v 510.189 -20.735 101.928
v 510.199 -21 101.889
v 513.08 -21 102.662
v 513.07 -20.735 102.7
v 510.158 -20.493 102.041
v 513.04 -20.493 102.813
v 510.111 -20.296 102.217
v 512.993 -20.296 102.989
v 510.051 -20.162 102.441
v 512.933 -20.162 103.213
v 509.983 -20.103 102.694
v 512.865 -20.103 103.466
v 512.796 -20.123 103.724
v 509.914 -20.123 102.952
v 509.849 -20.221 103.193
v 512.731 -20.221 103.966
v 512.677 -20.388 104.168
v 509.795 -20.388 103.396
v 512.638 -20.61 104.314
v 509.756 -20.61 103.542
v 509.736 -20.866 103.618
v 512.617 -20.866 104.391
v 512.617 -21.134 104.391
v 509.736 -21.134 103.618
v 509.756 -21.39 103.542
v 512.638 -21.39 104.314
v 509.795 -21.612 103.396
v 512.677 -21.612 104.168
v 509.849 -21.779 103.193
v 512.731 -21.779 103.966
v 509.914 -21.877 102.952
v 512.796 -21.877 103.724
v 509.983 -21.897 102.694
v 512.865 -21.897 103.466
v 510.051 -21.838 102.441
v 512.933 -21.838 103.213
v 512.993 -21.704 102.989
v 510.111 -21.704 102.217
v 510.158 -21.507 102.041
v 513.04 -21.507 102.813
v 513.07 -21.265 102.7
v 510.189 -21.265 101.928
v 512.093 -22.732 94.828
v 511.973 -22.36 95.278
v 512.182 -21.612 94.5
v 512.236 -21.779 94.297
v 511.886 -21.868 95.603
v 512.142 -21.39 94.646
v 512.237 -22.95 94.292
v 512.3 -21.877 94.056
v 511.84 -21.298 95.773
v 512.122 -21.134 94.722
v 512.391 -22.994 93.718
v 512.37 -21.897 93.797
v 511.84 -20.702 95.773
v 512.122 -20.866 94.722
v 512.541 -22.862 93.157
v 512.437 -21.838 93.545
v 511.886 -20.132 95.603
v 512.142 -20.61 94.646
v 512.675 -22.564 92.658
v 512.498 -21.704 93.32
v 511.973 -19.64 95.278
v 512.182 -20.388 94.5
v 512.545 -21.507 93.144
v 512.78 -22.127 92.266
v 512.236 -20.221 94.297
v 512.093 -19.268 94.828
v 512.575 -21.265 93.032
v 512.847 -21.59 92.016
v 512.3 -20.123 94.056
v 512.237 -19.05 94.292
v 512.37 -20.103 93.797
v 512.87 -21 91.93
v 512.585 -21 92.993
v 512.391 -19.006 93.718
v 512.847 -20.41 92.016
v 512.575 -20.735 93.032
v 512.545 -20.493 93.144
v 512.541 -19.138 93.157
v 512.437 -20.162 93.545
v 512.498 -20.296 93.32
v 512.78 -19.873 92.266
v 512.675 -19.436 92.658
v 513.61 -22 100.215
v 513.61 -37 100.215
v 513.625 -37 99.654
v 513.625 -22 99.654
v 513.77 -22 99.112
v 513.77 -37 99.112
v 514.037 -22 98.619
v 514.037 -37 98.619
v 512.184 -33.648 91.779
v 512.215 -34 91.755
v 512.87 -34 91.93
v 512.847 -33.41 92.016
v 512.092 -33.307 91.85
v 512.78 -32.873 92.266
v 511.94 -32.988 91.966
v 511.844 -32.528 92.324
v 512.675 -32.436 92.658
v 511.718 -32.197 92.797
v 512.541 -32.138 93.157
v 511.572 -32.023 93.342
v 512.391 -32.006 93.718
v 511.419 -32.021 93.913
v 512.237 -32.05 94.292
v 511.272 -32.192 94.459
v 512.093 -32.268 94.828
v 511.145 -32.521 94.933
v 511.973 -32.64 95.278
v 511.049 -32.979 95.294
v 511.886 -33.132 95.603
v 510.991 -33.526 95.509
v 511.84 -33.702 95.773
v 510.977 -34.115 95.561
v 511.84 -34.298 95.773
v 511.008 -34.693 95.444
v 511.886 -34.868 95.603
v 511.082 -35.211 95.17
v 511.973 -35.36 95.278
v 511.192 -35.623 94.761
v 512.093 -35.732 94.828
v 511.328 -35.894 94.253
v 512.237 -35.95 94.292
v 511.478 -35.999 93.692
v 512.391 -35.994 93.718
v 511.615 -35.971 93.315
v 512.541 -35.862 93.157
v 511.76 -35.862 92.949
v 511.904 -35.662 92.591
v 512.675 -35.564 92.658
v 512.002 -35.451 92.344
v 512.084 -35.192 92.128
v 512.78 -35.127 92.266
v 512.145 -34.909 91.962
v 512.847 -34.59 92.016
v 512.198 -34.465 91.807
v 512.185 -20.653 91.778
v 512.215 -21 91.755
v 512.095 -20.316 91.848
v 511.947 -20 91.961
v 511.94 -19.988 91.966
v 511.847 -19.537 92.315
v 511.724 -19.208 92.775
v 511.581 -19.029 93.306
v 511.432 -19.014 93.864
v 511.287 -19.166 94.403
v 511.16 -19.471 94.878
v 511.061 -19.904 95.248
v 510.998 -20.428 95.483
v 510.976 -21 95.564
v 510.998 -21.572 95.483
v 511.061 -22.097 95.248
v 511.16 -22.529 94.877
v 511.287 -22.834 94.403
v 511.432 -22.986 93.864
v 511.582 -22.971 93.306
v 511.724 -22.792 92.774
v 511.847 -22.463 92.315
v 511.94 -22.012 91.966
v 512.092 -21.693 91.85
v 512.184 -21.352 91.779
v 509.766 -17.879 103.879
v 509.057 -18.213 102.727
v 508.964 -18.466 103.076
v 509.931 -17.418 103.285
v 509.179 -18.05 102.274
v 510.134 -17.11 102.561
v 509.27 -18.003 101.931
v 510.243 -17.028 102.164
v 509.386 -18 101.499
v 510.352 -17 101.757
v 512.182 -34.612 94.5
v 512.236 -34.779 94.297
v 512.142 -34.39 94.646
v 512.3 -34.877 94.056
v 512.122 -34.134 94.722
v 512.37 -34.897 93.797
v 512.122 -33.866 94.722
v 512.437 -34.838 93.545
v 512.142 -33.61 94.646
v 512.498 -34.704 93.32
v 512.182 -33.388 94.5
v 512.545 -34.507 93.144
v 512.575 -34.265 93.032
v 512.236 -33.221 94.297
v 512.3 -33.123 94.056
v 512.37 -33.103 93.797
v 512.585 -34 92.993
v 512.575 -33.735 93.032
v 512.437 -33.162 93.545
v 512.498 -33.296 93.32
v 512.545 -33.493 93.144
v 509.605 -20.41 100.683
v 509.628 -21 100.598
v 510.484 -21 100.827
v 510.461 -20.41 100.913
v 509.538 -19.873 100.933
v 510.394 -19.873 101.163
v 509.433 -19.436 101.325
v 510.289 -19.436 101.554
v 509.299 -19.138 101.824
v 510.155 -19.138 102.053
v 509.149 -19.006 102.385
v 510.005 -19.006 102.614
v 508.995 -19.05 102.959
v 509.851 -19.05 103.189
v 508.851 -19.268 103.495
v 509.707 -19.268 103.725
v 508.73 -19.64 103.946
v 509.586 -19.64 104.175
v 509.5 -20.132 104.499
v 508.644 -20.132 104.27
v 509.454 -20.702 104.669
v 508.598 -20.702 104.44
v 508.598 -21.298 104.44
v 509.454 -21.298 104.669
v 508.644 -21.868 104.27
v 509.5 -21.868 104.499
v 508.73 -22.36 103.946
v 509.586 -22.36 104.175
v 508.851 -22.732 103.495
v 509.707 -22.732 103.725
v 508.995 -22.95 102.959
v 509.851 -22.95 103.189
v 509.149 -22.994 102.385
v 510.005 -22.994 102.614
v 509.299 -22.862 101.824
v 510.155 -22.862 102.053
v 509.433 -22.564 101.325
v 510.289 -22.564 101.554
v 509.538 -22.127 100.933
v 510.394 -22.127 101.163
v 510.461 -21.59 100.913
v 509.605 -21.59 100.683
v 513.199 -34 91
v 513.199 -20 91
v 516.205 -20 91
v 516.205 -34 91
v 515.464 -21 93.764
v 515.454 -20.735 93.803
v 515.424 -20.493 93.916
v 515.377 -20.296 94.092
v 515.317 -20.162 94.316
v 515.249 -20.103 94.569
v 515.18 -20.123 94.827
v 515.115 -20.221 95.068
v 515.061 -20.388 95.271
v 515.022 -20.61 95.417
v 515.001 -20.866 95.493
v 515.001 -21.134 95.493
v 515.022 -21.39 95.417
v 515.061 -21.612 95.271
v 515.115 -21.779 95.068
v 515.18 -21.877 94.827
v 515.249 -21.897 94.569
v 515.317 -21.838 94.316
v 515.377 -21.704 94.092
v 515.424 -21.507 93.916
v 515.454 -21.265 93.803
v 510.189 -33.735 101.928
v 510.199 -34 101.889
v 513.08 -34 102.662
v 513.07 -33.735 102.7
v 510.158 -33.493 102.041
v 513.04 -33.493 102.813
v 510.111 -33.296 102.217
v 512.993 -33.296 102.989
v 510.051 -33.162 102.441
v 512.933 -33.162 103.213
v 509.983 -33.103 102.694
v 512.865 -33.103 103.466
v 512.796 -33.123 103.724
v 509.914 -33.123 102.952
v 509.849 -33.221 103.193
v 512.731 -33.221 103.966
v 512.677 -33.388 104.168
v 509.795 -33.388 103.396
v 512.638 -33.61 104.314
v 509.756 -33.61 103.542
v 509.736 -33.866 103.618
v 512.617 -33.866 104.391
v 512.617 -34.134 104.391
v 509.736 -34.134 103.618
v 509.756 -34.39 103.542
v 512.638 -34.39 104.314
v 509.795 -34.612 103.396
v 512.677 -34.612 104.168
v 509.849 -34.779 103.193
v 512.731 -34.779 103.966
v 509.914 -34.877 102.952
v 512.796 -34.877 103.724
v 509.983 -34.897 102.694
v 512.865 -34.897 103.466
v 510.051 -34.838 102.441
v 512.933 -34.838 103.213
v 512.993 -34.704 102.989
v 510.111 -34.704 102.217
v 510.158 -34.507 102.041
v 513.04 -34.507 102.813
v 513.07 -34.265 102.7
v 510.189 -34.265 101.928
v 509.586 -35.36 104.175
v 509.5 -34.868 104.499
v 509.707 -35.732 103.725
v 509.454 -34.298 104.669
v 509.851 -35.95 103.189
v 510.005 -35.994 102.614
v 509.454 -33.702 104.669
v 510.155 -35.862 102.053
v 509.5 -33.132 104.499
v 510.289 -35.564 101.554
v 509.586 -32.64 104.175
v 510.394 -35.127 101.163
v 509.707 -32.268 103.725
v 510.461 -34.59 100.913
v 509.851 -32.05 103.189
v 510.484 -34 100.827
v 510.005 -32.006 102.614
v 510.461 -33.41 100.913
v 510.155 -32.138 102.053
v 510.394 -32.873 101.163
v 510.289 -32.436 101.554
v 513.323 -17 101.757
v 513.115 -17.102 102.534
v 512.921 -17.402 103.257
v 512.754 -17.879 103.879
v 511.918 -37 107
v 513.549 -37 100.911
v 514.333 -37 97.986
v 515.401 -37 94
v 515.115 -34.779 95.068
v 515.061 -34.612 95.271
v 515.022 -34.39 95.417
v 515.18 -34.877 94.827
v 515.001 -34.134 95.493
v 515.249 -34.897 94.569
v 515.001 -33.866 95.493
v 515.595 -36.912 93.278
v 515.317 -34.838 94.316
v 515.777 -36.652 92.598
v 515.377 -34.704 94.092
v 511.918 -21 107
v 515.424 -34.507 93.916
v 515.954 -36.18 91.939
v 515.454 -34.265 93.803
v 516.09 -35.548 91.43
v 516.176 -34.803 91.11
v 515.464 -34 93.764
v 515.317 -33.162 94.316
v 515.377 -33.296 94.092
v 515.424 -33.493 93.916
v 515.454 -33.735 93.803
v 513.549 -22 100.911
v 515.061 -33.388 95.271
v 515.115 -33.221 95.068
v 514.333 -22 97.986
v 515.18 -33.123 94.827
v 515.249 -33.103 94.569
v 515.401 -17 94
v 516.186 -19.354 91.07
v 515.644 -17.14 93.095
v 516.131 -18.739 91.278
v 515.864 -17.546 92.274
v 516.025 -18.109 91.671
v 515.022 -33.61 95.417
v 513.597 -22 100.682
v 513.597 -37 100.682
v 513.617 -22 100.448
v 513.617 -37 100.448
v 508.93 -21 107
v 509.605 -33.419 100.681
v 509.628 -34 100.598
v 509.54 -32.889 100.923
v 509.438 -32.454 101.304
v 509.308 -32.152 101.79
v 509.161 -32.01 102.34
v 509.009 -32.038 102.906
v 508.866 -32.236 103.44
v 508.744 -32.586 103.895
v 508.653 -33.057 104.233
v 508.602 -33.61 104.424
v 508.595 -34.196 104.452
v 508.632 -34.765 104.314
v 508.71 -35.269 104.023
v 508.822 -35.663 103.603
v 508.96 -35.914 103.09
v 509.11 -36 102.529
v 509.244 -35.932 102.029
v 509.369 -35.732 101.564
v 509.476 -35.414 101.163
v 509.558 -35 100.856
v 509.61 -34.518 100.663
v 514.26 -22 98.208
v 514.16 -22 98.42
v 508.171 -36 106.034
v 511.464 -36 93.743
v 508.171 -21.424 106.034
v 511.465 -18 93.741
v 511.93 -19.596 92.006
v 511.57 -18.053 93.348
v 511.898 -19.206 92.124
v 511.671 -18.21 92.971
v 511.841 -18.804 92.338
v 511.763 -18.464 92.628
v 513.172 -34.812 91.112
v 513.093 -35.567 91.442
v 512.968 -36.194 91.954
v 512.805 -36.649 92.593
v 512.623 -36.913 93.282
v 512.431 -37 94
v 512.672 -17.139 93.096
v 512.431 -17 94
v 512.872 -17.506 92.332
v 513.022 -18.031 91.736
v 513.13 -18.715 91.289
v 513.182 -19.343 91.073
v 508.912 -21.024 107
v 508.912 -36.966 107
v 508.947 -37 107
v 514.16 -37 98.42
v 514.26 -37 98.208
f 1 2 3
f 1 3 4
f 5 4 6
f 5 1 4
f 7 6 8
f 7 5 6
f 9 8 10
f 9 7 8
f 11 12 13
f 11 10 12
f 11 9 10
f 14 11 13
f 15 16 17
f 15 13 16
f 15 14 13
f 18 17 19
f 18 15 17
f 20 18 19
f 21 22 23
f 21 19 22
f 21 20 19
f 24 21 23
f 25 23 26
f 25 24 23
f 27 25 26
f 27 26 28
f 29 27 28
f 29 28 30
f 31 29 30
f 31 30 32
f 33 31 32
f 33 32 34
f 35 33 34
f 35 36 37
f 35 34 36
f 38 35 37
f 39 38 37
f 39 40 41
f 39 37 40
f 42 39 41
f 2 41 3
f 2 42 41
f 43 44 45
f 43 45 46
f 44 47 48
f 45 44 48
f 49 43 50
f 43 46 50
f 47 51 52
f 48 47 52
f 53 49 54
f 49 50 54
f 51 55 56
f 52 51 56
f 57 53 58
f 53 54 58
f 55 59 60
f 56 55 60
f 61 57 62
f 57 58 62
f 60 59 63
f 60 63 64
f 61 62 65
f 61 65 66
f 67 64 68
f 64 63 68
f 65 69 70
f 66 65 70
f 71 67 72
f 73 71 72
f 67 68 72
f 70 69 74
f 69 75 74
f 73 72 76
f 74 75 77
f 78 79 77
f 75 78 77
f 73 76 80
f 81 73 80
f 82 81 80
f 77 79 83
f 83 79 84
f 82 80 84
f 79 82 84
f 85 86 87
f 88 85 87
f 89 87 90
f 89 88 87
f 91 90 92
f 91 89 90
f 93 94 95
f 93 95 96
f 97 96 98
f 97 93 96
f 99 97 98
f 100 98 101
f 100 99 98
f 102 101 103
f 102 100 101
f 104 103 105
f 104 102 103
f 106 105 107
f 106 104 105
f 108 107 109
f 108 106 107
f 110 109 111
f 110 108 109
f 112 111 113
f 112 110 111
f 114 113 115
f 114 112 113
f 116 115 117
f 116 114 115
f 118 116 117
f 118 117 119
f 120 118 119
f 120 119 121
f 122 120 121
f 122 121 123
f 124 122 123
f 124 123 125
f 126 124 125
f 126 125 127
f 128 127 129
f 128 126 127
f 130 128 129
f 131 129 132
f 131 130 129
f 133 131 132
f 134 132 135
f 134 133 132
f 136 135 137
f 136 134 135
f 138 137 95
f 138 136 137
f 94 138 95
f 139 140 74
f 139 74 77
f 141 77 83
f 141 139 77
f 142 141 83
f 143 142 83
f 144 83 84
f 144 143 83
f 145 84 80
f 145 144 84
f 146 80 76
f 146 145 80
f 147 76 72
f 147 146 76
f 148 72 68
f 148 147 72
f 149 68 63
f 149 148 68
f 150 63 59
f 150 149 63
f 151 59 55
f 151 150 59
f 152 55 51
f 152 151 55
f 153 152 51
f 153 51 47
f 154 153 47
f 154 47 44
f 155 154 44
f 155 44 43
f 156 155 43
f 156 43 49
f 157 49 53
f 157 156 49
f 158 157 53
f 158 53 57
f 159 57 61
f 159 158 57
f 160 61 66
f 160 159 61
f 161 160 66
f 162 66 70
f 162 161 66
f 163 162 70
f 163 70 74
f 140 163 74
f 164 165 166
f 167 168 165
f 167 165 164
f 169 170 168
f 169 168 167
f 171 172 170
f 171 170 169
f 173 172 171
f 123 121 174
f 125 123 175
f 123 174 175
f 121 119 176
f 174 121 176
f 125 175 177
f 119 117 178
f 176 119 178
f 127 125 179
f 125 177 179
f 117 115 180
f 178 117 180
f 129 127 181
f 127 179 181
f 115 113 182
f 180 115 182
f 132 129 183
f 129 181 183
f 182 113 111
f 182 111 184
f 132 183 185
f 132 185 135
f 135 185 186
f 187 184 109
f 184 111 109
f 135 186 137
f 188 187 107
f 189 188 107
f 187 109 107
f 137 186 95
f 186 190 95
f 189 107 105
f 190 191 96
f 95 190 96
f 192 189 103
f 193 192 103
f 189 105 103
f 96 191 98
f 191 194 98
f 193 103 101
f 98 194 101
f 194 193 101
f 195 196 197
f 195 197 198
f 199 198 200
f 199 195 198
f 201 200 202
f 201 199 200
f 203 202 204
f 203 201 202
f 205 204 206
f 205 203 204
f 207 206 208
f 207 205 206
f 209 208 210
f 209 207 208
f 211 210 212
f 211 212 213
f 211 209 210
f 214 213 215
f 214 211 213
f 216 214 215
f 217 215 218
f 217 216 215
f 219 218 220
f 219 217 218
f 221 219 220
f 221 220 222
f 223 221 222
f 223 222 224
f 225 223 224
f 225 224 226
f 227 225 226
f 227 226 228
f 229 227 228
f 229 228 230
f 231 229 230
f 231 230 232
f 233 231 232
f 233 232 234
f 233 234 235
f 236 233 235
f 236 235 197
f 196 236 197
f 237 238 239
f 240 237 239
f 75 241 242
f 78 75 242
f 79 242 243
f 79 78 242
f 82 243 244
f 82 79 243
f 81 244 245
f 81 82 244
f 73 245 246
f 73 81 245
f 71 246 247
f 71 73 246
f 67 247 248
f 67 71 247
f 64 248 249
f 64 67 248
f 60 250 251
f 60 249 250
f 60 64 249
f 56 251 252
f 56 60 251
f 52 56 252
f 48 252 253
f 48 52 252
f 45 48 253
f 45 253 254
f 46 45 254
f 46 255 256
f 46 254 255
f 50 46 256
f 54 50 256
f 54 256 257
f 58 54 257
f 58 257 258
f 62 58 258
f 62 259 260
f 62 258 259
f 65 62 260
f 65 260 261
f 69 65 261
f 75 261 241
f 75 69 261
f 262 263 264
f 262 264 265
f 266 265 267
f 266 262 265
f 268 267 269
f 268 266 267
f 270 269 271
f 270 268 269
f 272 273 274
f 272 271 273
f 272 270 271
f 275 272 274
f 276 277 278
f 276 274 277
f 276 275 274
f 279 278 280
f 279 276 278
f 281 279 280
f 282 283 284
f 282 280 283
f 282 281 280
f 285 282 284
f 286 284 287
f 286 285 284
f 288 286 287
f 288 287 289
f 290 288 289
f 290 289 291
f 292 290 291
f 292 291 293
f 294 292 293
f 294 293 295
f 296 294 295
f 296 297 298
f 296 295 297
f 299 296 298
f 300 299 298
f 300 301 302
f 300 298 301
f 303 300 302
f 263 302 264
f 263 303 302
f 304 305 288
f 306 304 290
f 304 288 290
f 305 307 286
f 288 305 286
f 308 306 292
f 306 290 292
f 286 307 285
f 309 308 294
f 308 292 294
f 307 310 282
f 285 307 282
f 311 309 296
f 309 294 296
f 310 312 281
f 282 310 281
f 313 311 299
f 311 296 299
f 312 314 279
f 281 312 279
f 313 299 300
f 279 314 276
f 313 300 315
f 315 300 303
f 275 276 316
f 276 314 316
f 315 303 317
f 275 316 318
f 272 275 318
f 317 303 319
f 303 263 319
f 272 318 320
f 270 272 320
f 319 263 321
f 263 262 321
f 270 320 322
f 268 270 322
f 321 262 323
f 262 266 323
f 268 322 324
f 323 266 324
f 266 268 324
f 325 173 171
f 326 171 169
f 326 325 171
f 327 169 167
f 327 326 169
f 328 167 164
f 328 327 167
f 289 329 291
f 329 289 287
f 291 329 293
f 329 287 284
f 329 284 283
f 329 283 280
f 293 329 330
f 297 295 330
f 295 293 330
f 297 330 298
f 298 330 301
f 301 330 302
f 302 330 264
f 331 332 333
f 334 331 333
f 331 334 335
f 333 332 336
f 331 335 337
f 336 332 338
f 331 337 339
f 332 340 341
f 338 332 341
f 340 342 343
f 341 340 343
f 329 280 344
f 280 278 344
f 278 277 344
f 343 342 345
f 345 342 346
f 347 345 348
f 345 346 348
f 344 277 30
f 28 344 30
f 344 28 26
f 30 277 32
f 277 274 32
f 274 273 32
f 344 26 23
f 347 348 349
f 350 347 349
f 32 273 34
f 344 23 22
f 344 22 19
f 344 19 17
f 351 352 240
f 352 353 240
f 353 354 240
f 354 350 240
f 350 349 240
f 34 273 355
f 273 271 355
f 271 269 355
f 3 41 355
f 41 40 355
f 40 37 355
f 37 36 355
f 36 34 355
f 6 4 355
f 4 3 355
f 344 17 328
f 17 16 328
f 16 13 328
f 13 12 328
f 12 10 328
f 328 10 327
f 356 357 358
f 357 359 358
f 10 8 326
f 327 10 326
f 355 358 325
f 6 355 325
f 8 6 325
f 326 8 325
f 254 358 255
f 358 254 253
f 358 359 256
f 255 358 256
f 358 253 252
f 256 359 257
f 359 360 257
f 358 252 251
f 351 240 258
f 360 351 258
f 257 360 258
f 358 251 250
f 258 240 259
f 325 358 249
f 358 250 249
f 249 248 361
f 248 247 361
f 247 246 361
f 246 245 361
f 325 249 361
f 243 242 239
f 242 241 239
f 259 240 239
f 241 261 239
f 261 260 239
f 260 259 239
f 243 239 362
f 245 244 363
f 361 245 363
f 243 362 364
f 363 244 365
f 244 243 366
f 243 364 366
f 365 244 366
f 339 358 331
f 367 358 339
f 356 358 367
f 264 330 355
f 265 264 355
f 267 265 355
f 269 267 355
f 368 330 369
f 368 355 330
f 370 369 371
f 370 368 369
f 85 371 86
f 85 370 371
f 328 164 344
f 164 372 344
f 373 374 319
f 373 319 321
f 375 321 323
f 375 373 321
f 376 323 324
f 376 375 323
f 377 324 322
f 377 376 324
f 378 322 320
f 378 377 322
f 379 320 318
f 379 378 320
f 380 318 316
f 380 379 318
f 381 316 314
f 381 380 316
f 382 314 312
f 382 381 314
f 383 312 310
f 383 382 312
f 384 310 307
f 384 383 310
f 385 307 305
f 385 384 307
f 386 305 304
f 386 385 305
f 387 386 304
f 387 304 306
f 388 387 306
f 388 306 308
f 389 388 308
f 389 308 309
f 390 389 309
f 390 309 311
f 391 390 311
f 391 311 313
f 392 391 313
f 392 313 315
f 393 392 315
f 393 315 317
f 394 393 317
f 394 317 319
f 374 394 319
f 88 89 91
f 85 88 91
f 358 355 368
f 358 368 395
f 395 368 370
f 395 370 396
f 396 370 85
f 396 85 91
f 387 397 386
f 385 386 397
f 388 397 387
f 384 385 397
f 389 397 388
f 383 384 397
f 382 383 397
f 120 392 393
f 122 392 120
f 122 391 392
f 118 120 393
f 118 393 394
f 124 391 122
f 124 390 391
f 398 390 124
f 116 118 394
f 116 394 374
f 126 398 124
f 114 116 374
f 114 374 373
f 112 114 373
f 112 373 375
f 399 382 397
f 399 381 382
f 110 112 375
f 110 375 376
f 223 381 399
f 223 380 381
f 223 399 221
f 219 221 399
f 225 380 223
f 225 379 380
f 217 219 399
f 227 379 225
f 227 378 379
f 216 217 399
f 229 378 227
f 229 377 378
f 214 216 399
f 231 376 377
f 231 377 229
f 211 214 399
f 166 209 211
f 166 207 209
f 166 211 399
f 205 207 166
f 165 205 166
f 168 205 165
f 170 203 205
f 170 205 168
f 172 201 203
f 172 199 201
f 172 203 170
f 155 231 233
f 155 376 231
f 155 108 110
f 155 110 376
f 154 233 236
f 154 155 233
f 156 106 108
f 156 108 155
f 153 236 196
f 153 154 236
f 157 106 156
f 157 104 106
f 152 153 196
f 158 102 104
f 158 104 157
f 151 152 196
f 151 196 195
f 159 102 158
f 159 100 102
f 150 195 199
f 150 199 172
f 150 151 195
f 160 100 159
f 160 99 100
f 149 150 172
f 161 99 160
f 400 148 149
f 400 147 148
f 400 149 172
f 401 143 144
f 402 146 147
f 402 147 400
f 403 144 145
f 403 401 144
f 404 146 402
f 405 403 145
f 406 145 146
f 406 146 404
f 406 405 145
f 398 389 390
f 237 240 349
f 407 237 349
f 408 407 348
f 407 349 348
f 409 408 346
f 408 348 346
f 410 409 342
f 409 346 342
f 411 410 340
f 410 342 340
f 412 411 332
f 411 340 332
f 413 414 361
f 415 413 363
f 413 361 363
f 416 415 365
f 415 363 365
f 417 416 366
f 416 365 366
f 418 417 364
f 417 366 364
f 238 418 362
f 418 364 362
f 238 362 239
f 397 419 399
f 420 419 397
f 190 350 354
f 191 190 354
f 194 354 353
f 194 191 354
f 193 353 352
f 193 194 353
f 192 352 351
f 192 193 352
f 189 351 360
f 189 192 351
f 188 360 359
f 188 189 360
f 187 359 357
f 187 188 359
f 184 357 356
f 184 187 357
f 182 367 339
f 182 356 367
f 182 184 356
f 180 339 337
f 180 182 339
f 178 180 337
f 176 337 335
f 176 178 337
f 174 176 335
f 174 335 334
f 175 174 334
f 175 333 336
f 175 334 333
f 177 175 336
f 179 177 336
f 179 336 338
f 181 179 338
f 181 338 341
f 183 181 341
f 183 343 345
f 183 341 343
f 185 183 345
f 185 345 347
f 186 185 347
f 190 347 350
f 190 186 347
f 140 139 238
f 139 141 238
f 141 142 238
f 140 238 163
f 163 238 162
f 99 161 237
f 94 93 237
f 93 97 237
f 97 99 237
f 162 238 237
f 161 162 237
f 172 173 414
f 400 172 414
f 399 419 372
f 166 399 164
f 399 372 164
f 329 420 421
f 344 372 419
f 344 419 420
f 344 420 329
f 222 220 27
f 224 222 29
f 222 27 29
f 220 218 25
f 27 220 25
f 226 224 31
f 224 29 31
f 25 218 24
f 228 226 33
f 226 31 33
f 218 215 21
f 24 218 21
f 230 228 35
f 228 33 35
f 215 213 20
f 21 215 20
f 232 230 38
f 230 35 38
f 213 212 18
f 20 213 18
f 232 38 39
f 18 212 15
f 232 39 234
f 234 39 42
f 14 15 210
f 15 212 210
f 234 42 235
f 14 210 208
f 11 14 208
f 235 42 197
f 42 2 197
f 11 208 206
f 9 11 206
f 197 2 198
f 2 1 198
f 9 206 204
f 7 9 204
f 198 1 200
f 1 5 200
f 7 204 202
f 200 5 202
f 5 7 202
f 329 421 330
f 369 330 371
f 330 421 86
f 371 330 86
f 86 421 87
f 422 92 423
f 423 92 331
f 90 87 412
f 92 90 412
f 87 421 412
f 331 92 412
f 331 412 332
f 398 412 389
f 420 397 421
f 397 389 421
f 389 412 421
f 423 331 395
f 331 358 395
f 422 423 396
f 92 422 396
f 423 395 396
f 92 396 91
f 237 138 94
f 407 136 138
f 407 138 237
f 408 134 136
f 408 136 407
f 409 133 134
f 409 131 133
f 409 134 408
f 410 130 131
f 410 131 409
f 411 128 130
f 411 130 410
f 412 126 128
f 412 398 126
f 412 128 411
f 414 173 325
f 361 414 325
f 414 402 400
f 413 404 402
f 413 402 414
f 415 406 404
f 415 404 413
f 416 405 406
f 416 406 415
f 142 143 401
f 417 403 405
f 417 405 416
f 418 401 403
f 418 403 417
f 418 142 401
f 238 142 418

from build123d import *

# Parameters (mm, degrees)
CYLINDER119_R               = 2
CYLINDER119_DEPTH           = 1
CYLINDER119_PLACEMENT_ANGLE = 75
CYLINDER121_R               = 2
CYLINDER121_DEPTH           = 1
CYLINDER121_PLACEMENT_ANGLE = 75
CYLINDER122_R               = 2
CYLINDER122_DEPTH           = 1.4
CYLINDER122_PLACEMENT_ANGLE = 75
CYLINDER120_R               = 2
CYLINDER120_DEPTH           = 1.4
CYLINDER120_PLACEMENT_ANGLE = 75
CYLINDER118_R               = 2.4
CYLINDER118_DEPTH           = 15
CYLINDER118_ROLL_ANGLE      = 90
CYLINDER116_R               = 0.9
CYLINDER116_DEPTH           = 9
CYLINDER116_PLACEMENT_ANGLE = 75
CYLINDER117_R               = 0.9
CYLINDER117_DEPTH           = 9
CYLINDER117_PLACEMENT_ANGLE = 75
CYLINDER115_R               = 0.9
CYLINDER115_DEPTH           = 9
CYLINDER115_PLACEMENT_ANGLE = 75
CYLINDER114_R               = 0.9
CYLINDER114_DEPTH           = 9
CYLINDER114_PLACEMENT_ANGLE = 75
BOX098_W                    = 40
BOX098_H                    = 156
BOX098_DEPTH                = 130
BOX098_PITCH_ANGLE          = -15
BOX099_W                    = 30
BOX099_H                    = 156
BOX099_DEPTH                = 130
BOX099_PITCH_ANGLE          = -15
BOX100_W                    = 10
BOX100_H                    = 20
BOX100_DEPTH                = 16
CHAMFER010_SIZE             = 4
FILLET024_R                 = 3
CHAMFER011_SIZE             = 1
FILLET025_R                 = 2


with BuildPart() as cylinder119:
    # Cylinder119 → Cylinder119 (new body)
    with BuildSketch(Plane.XY):
        Circle(CYLINDER119_R)
    extrude(amount=CYLINDER119_DEPTH)


with BuildPart() as cylinder119_1:
    # Cylinder119 placement: moved
    add(cylinder119.part.moved(Location((509, -34, 102.5))).rotate(Axis((509, -34, 102.5), (0, 1, 0)), CYLINDER119_PLACEMENT_ANGLE))


with BuildPart() as fusion122:
    # Cylinder121 → Cylinder121 (new body)
    with BuildSketch(Plane.XY):
        Circle(CYLINDER121_R)
    extrude(amount=CYLINDER121_DEPTH)


with BuildPart() as fusion122_1:
    # Cylinder121 placement: moved
    add(fusion122.part.moved(Location((509, -21, 102.5))).rotate(Axis((509, -21, 102.5), (0, 1, 0)), CYLINDER121_PLACEMENT_ANGLE))

    # Fusion122: union Cylinder119
    add(cylinder119_1.part)


with BuildPart() as cylinder122:
    # Cylinder122 → Cylinder122 (new body)
    with BuildSketch(Plane.XY):
        Circle(CYLINDER122_R)
    extrude(amount=CYLINDER122_DEPTH)


with BuildPart() as cylinder122_1:
    # Cylinder122 placement: moved
    add(cylinder122.part.moved(Location((509, -34, 102.5))).rotate(Axis((509, -34, 102.5), (0, 1, 0)), CYLINDER122_PLACEMENT_ANGLE))


with BuildPart() as fusion123:
    # Cylinder120 → Cylinder120 (new body)
    with BuildSketch(Plane.XY):
        Circle(CYLINDER120_R)
    extrude(amount=CYLINDER120_DEPTH)


with BuildPart() as fusion123_1:
    # Cylinder120 placement: moved
    add(fusion123.part.moved(Location((509, -21, 102.5))).rotate(Axis((509, -21, 102.5), (0, 1, 0)), CYLINDER120_PLACEMENT_ANGLE))

    # Fusion124: union Cylinder122
    add(cylinder122_1.part)


with BuildPart() as fusion123_2:
    # Fusion124 placement: moved
    add(fusion123_1.part.moved(Location((2, 0, -9))))

    # Fusion123: union Fusion122
    add(fusion122_1.part)


with BuildPart() as cylinder118:
    # Cylinder118 → Cylinder118 (new body)
    with BuildSketch(Plane.XY):
        Circle(CYLINDER118_R)
    extrude(amount=CYLINDER118_DEPTH)


with BuildPart() as cylinder118_1:
    # Cylinder118 roll: moved
    add(cylinder118.part.rotate(Axis((0, 0, 0), (1, 0, 0)), CYLINDER118_ROLL_ANGLE))


with BuildPart() as cylinder118_2:
    # Cylinder118 placement: moved
    add(cylinder118_1.part.moved(Location((516, -22, 100))))


with BuildPart() as cylinder116:
    # Cylinder116 → Cylinder116 (new body)
    with BuildSketch(Plane.XY):
        Circle(CYLINDER116_R)
    extrude(amount=CYLINDER116_DEPTH)


with BuildPart() as cylinder116_1:
    # Cylinder116 placement: moved
    add(cylinder116.part.moved(Location((509, -34, 102.5))).rotate(Axis((509, -34, 102.5), (0, 1, 0)), CYLINDER116_PLACEMENT_ANGLE))


with BuildPart() as fusion120:
    # Cylinder117 → Cylinder117 (new body)
    with BuildSketch(Plane.XY):
        Circle(CYLINDER117_R)
    extrude(amount=CYLINDER117_DEPTH)


with BuildPart() as fusion120_1:
    # Cylinder117 placement: moved
    add(fusion120.part.moved(Location((509, -21, 102.5))).rotate(Axis((509, -21, 102.5), (0, 1, 0)), CYLINDER117_PLACEMENT_ANGLE))

    # Fusion120: union Cylinder116
    add(cylinder116_1.part)


with BuildPart() as cylinder115:
    # Cylinder115 → Cylinder115 (new body)
    with BuildSketch(Plane.XY):
        Circle(CYLINDER115_R)
    extrude(amount=CYLINDER115_DEPTH)


with BuildPart() as cylinder115_1:
    # Cylinder115 placement: moved
    add(cylinder115.part.moved(Location((509, -34, 102.5))).rotate(Axis((509, -34, 102.5), (0, 1, 0)), CYLINDER115_PLACEMENT_ANGLE))


with BuildPart() as fusion121:
    # Cylinder114 → Cylinder114 (new body)
    with BuildSketch(Plane.XY):
        Circle(CYLINDER114_R)
    extrude(amount=CYLINDER114_DEPTH)


with BuildPart() as fusion121_1:
    # Cylinder114 placement: moved
    add(fusion121.part.moved(Location((509, -21, 102.5))).rotate(Axis((509, -21, 102.5), (0, 1, 0)), CYLINDER114_PLACEMENT_ANGLE))

    # Fusion119: union Cylinder115
    add(cylinder115_1.part)


with BuildPart() as fusion121_2:
    # Fusion119 placement: moved
    add(fusion121_1.part.moved(Location((2, 0, -9))))

    # Fusion121: union Fusion120
    add(fusion120_1.part)


with BuildPart() as cube070:
    # Box098 → Box098 (new body)
    with BuildSketch(Plane.XY):
        with Locations((20, 78)):
            Rectangle(BOX098_W, BOX098_H)
    extrude(amount=BOX098_DEPTH)


with BuildPart() as cube070_1:
    # Box098 pitch: moved
    add(cube070.part.rotate(Axis((0, 0, 0), (0, 1, 0)), BOX098_PITCH_ANGLE))


with BuildPart() as cube070_2:
    # Box098 placement: moved
    add(cube070_1.part.moved(Location((569, -38, -9))))


with BuildPart() as fusion118:
    # Box099 → Box099 (new body)
    with BuildSketch(Plane.XY):
        with Locations((15, 78)):
            Rectangle(BOX099_W, BOX099_H)
    extrude(amount=BOX099_DEPTH)


with BuildPart() as fusion118_1:
    # Box099 pitch: moved
    add(fusion118.part.rotate(Axis((0, 0, 0), (0, 1, 0)), BOX099_PITCH_ANGLE))


with BuildPart() as fusion118_2:
    # Box099 placement: moved
    add(fusion118_1.part.moved(Location((533.4, -38, -7))))

    # Fusion118: union Cube070
    add(cube070_2.part)


with BuildPart() as fusion118_3:
    # Fusion118 placement: moved
    add(fusion118_2.part.moved(Location((-22, 0, 0))))


with BuildPart() as door_rear_bar_holder_left:
    # Box100 → Box100 (new body)
    with BuildSketch(Plane(origin=(511, -37, 98), x_dir=(1, 0, 0), z_dir=(0, 0, 1))):
        with Locations((5, 10)):
            Rectangle(BOX100_W, BOX100_H)
    extrude(amount=BOX100_DEPTH)

    # Chamfer010
    chamfer010_edges = [door_rear_bar_holder_left.edges().sort_by_distance(p)[0] for p in [
        (516, -17, 114),
    ]]
    chamfer(chamfer010_edges, length=CHAMFER010_SIZE)


with BuildPart() as door_rear_bar_holder_left_1:
    # Chamfer010 placement: moved
    add(door_rear_bar_holder_left.part.moved(Location((0, 0, -7))))

    # Cut117: cut Fusion118
    add(fusion118_3.part, mode=Mode.SUBTRACT)


with BuildPart() as door_rear_bar_holder_left_2:
    # Cut117 placement: moved
    add(door_rear_bar_holder_left_1.part.moved(Location((-4, 0, 0))))

    # Cut118: cut Fusion121
    add(fusion121_2.part, mode=Mode.SUBTRACT)

    # Fillet024
    fillet024_edges = [door_rear_bar_holder_left_2.edges().sort_by_distance(p)[0] for p in [
        (510.986782, -17, 103),
        (514.202173, -37, 91),
        (514.202173, -17, 91),
    ]]
    fillet(fillet024_edges, radius=FILLET024_R)

    # Chamfer011
    chamfer011_edges = [door_rear_bar_holder_left_2.edges().sort_by_distance(p)[0] for p in [
        (507.912077, -29, 107),
        (512.199265, -27, 91),
    ]]
    chamfer(chamfer011_edges, length=CHAMFER011_SIZE)

    # Cut119: cut Cylinder118
    add(cylinder118_2.part, mode=Mode.SUBTRACT)

    # Fillet025
    fillet025_edges = [door_rear_bar_holder_left_2.edges().sort_by_distance(p)[0] for p in [
        (514.226943, -29.5, 98.382512),
        (513.655743, -29.5, 100.514257),
    ]]
    fillet(fillet025_edges, radius=FILLET025_R)

    # Cut120: cut Fusion123
    add(fusion123_2.part, mode=Mode.SUBTRACT)


solid = door_rear_bar_holder_left_2.part
